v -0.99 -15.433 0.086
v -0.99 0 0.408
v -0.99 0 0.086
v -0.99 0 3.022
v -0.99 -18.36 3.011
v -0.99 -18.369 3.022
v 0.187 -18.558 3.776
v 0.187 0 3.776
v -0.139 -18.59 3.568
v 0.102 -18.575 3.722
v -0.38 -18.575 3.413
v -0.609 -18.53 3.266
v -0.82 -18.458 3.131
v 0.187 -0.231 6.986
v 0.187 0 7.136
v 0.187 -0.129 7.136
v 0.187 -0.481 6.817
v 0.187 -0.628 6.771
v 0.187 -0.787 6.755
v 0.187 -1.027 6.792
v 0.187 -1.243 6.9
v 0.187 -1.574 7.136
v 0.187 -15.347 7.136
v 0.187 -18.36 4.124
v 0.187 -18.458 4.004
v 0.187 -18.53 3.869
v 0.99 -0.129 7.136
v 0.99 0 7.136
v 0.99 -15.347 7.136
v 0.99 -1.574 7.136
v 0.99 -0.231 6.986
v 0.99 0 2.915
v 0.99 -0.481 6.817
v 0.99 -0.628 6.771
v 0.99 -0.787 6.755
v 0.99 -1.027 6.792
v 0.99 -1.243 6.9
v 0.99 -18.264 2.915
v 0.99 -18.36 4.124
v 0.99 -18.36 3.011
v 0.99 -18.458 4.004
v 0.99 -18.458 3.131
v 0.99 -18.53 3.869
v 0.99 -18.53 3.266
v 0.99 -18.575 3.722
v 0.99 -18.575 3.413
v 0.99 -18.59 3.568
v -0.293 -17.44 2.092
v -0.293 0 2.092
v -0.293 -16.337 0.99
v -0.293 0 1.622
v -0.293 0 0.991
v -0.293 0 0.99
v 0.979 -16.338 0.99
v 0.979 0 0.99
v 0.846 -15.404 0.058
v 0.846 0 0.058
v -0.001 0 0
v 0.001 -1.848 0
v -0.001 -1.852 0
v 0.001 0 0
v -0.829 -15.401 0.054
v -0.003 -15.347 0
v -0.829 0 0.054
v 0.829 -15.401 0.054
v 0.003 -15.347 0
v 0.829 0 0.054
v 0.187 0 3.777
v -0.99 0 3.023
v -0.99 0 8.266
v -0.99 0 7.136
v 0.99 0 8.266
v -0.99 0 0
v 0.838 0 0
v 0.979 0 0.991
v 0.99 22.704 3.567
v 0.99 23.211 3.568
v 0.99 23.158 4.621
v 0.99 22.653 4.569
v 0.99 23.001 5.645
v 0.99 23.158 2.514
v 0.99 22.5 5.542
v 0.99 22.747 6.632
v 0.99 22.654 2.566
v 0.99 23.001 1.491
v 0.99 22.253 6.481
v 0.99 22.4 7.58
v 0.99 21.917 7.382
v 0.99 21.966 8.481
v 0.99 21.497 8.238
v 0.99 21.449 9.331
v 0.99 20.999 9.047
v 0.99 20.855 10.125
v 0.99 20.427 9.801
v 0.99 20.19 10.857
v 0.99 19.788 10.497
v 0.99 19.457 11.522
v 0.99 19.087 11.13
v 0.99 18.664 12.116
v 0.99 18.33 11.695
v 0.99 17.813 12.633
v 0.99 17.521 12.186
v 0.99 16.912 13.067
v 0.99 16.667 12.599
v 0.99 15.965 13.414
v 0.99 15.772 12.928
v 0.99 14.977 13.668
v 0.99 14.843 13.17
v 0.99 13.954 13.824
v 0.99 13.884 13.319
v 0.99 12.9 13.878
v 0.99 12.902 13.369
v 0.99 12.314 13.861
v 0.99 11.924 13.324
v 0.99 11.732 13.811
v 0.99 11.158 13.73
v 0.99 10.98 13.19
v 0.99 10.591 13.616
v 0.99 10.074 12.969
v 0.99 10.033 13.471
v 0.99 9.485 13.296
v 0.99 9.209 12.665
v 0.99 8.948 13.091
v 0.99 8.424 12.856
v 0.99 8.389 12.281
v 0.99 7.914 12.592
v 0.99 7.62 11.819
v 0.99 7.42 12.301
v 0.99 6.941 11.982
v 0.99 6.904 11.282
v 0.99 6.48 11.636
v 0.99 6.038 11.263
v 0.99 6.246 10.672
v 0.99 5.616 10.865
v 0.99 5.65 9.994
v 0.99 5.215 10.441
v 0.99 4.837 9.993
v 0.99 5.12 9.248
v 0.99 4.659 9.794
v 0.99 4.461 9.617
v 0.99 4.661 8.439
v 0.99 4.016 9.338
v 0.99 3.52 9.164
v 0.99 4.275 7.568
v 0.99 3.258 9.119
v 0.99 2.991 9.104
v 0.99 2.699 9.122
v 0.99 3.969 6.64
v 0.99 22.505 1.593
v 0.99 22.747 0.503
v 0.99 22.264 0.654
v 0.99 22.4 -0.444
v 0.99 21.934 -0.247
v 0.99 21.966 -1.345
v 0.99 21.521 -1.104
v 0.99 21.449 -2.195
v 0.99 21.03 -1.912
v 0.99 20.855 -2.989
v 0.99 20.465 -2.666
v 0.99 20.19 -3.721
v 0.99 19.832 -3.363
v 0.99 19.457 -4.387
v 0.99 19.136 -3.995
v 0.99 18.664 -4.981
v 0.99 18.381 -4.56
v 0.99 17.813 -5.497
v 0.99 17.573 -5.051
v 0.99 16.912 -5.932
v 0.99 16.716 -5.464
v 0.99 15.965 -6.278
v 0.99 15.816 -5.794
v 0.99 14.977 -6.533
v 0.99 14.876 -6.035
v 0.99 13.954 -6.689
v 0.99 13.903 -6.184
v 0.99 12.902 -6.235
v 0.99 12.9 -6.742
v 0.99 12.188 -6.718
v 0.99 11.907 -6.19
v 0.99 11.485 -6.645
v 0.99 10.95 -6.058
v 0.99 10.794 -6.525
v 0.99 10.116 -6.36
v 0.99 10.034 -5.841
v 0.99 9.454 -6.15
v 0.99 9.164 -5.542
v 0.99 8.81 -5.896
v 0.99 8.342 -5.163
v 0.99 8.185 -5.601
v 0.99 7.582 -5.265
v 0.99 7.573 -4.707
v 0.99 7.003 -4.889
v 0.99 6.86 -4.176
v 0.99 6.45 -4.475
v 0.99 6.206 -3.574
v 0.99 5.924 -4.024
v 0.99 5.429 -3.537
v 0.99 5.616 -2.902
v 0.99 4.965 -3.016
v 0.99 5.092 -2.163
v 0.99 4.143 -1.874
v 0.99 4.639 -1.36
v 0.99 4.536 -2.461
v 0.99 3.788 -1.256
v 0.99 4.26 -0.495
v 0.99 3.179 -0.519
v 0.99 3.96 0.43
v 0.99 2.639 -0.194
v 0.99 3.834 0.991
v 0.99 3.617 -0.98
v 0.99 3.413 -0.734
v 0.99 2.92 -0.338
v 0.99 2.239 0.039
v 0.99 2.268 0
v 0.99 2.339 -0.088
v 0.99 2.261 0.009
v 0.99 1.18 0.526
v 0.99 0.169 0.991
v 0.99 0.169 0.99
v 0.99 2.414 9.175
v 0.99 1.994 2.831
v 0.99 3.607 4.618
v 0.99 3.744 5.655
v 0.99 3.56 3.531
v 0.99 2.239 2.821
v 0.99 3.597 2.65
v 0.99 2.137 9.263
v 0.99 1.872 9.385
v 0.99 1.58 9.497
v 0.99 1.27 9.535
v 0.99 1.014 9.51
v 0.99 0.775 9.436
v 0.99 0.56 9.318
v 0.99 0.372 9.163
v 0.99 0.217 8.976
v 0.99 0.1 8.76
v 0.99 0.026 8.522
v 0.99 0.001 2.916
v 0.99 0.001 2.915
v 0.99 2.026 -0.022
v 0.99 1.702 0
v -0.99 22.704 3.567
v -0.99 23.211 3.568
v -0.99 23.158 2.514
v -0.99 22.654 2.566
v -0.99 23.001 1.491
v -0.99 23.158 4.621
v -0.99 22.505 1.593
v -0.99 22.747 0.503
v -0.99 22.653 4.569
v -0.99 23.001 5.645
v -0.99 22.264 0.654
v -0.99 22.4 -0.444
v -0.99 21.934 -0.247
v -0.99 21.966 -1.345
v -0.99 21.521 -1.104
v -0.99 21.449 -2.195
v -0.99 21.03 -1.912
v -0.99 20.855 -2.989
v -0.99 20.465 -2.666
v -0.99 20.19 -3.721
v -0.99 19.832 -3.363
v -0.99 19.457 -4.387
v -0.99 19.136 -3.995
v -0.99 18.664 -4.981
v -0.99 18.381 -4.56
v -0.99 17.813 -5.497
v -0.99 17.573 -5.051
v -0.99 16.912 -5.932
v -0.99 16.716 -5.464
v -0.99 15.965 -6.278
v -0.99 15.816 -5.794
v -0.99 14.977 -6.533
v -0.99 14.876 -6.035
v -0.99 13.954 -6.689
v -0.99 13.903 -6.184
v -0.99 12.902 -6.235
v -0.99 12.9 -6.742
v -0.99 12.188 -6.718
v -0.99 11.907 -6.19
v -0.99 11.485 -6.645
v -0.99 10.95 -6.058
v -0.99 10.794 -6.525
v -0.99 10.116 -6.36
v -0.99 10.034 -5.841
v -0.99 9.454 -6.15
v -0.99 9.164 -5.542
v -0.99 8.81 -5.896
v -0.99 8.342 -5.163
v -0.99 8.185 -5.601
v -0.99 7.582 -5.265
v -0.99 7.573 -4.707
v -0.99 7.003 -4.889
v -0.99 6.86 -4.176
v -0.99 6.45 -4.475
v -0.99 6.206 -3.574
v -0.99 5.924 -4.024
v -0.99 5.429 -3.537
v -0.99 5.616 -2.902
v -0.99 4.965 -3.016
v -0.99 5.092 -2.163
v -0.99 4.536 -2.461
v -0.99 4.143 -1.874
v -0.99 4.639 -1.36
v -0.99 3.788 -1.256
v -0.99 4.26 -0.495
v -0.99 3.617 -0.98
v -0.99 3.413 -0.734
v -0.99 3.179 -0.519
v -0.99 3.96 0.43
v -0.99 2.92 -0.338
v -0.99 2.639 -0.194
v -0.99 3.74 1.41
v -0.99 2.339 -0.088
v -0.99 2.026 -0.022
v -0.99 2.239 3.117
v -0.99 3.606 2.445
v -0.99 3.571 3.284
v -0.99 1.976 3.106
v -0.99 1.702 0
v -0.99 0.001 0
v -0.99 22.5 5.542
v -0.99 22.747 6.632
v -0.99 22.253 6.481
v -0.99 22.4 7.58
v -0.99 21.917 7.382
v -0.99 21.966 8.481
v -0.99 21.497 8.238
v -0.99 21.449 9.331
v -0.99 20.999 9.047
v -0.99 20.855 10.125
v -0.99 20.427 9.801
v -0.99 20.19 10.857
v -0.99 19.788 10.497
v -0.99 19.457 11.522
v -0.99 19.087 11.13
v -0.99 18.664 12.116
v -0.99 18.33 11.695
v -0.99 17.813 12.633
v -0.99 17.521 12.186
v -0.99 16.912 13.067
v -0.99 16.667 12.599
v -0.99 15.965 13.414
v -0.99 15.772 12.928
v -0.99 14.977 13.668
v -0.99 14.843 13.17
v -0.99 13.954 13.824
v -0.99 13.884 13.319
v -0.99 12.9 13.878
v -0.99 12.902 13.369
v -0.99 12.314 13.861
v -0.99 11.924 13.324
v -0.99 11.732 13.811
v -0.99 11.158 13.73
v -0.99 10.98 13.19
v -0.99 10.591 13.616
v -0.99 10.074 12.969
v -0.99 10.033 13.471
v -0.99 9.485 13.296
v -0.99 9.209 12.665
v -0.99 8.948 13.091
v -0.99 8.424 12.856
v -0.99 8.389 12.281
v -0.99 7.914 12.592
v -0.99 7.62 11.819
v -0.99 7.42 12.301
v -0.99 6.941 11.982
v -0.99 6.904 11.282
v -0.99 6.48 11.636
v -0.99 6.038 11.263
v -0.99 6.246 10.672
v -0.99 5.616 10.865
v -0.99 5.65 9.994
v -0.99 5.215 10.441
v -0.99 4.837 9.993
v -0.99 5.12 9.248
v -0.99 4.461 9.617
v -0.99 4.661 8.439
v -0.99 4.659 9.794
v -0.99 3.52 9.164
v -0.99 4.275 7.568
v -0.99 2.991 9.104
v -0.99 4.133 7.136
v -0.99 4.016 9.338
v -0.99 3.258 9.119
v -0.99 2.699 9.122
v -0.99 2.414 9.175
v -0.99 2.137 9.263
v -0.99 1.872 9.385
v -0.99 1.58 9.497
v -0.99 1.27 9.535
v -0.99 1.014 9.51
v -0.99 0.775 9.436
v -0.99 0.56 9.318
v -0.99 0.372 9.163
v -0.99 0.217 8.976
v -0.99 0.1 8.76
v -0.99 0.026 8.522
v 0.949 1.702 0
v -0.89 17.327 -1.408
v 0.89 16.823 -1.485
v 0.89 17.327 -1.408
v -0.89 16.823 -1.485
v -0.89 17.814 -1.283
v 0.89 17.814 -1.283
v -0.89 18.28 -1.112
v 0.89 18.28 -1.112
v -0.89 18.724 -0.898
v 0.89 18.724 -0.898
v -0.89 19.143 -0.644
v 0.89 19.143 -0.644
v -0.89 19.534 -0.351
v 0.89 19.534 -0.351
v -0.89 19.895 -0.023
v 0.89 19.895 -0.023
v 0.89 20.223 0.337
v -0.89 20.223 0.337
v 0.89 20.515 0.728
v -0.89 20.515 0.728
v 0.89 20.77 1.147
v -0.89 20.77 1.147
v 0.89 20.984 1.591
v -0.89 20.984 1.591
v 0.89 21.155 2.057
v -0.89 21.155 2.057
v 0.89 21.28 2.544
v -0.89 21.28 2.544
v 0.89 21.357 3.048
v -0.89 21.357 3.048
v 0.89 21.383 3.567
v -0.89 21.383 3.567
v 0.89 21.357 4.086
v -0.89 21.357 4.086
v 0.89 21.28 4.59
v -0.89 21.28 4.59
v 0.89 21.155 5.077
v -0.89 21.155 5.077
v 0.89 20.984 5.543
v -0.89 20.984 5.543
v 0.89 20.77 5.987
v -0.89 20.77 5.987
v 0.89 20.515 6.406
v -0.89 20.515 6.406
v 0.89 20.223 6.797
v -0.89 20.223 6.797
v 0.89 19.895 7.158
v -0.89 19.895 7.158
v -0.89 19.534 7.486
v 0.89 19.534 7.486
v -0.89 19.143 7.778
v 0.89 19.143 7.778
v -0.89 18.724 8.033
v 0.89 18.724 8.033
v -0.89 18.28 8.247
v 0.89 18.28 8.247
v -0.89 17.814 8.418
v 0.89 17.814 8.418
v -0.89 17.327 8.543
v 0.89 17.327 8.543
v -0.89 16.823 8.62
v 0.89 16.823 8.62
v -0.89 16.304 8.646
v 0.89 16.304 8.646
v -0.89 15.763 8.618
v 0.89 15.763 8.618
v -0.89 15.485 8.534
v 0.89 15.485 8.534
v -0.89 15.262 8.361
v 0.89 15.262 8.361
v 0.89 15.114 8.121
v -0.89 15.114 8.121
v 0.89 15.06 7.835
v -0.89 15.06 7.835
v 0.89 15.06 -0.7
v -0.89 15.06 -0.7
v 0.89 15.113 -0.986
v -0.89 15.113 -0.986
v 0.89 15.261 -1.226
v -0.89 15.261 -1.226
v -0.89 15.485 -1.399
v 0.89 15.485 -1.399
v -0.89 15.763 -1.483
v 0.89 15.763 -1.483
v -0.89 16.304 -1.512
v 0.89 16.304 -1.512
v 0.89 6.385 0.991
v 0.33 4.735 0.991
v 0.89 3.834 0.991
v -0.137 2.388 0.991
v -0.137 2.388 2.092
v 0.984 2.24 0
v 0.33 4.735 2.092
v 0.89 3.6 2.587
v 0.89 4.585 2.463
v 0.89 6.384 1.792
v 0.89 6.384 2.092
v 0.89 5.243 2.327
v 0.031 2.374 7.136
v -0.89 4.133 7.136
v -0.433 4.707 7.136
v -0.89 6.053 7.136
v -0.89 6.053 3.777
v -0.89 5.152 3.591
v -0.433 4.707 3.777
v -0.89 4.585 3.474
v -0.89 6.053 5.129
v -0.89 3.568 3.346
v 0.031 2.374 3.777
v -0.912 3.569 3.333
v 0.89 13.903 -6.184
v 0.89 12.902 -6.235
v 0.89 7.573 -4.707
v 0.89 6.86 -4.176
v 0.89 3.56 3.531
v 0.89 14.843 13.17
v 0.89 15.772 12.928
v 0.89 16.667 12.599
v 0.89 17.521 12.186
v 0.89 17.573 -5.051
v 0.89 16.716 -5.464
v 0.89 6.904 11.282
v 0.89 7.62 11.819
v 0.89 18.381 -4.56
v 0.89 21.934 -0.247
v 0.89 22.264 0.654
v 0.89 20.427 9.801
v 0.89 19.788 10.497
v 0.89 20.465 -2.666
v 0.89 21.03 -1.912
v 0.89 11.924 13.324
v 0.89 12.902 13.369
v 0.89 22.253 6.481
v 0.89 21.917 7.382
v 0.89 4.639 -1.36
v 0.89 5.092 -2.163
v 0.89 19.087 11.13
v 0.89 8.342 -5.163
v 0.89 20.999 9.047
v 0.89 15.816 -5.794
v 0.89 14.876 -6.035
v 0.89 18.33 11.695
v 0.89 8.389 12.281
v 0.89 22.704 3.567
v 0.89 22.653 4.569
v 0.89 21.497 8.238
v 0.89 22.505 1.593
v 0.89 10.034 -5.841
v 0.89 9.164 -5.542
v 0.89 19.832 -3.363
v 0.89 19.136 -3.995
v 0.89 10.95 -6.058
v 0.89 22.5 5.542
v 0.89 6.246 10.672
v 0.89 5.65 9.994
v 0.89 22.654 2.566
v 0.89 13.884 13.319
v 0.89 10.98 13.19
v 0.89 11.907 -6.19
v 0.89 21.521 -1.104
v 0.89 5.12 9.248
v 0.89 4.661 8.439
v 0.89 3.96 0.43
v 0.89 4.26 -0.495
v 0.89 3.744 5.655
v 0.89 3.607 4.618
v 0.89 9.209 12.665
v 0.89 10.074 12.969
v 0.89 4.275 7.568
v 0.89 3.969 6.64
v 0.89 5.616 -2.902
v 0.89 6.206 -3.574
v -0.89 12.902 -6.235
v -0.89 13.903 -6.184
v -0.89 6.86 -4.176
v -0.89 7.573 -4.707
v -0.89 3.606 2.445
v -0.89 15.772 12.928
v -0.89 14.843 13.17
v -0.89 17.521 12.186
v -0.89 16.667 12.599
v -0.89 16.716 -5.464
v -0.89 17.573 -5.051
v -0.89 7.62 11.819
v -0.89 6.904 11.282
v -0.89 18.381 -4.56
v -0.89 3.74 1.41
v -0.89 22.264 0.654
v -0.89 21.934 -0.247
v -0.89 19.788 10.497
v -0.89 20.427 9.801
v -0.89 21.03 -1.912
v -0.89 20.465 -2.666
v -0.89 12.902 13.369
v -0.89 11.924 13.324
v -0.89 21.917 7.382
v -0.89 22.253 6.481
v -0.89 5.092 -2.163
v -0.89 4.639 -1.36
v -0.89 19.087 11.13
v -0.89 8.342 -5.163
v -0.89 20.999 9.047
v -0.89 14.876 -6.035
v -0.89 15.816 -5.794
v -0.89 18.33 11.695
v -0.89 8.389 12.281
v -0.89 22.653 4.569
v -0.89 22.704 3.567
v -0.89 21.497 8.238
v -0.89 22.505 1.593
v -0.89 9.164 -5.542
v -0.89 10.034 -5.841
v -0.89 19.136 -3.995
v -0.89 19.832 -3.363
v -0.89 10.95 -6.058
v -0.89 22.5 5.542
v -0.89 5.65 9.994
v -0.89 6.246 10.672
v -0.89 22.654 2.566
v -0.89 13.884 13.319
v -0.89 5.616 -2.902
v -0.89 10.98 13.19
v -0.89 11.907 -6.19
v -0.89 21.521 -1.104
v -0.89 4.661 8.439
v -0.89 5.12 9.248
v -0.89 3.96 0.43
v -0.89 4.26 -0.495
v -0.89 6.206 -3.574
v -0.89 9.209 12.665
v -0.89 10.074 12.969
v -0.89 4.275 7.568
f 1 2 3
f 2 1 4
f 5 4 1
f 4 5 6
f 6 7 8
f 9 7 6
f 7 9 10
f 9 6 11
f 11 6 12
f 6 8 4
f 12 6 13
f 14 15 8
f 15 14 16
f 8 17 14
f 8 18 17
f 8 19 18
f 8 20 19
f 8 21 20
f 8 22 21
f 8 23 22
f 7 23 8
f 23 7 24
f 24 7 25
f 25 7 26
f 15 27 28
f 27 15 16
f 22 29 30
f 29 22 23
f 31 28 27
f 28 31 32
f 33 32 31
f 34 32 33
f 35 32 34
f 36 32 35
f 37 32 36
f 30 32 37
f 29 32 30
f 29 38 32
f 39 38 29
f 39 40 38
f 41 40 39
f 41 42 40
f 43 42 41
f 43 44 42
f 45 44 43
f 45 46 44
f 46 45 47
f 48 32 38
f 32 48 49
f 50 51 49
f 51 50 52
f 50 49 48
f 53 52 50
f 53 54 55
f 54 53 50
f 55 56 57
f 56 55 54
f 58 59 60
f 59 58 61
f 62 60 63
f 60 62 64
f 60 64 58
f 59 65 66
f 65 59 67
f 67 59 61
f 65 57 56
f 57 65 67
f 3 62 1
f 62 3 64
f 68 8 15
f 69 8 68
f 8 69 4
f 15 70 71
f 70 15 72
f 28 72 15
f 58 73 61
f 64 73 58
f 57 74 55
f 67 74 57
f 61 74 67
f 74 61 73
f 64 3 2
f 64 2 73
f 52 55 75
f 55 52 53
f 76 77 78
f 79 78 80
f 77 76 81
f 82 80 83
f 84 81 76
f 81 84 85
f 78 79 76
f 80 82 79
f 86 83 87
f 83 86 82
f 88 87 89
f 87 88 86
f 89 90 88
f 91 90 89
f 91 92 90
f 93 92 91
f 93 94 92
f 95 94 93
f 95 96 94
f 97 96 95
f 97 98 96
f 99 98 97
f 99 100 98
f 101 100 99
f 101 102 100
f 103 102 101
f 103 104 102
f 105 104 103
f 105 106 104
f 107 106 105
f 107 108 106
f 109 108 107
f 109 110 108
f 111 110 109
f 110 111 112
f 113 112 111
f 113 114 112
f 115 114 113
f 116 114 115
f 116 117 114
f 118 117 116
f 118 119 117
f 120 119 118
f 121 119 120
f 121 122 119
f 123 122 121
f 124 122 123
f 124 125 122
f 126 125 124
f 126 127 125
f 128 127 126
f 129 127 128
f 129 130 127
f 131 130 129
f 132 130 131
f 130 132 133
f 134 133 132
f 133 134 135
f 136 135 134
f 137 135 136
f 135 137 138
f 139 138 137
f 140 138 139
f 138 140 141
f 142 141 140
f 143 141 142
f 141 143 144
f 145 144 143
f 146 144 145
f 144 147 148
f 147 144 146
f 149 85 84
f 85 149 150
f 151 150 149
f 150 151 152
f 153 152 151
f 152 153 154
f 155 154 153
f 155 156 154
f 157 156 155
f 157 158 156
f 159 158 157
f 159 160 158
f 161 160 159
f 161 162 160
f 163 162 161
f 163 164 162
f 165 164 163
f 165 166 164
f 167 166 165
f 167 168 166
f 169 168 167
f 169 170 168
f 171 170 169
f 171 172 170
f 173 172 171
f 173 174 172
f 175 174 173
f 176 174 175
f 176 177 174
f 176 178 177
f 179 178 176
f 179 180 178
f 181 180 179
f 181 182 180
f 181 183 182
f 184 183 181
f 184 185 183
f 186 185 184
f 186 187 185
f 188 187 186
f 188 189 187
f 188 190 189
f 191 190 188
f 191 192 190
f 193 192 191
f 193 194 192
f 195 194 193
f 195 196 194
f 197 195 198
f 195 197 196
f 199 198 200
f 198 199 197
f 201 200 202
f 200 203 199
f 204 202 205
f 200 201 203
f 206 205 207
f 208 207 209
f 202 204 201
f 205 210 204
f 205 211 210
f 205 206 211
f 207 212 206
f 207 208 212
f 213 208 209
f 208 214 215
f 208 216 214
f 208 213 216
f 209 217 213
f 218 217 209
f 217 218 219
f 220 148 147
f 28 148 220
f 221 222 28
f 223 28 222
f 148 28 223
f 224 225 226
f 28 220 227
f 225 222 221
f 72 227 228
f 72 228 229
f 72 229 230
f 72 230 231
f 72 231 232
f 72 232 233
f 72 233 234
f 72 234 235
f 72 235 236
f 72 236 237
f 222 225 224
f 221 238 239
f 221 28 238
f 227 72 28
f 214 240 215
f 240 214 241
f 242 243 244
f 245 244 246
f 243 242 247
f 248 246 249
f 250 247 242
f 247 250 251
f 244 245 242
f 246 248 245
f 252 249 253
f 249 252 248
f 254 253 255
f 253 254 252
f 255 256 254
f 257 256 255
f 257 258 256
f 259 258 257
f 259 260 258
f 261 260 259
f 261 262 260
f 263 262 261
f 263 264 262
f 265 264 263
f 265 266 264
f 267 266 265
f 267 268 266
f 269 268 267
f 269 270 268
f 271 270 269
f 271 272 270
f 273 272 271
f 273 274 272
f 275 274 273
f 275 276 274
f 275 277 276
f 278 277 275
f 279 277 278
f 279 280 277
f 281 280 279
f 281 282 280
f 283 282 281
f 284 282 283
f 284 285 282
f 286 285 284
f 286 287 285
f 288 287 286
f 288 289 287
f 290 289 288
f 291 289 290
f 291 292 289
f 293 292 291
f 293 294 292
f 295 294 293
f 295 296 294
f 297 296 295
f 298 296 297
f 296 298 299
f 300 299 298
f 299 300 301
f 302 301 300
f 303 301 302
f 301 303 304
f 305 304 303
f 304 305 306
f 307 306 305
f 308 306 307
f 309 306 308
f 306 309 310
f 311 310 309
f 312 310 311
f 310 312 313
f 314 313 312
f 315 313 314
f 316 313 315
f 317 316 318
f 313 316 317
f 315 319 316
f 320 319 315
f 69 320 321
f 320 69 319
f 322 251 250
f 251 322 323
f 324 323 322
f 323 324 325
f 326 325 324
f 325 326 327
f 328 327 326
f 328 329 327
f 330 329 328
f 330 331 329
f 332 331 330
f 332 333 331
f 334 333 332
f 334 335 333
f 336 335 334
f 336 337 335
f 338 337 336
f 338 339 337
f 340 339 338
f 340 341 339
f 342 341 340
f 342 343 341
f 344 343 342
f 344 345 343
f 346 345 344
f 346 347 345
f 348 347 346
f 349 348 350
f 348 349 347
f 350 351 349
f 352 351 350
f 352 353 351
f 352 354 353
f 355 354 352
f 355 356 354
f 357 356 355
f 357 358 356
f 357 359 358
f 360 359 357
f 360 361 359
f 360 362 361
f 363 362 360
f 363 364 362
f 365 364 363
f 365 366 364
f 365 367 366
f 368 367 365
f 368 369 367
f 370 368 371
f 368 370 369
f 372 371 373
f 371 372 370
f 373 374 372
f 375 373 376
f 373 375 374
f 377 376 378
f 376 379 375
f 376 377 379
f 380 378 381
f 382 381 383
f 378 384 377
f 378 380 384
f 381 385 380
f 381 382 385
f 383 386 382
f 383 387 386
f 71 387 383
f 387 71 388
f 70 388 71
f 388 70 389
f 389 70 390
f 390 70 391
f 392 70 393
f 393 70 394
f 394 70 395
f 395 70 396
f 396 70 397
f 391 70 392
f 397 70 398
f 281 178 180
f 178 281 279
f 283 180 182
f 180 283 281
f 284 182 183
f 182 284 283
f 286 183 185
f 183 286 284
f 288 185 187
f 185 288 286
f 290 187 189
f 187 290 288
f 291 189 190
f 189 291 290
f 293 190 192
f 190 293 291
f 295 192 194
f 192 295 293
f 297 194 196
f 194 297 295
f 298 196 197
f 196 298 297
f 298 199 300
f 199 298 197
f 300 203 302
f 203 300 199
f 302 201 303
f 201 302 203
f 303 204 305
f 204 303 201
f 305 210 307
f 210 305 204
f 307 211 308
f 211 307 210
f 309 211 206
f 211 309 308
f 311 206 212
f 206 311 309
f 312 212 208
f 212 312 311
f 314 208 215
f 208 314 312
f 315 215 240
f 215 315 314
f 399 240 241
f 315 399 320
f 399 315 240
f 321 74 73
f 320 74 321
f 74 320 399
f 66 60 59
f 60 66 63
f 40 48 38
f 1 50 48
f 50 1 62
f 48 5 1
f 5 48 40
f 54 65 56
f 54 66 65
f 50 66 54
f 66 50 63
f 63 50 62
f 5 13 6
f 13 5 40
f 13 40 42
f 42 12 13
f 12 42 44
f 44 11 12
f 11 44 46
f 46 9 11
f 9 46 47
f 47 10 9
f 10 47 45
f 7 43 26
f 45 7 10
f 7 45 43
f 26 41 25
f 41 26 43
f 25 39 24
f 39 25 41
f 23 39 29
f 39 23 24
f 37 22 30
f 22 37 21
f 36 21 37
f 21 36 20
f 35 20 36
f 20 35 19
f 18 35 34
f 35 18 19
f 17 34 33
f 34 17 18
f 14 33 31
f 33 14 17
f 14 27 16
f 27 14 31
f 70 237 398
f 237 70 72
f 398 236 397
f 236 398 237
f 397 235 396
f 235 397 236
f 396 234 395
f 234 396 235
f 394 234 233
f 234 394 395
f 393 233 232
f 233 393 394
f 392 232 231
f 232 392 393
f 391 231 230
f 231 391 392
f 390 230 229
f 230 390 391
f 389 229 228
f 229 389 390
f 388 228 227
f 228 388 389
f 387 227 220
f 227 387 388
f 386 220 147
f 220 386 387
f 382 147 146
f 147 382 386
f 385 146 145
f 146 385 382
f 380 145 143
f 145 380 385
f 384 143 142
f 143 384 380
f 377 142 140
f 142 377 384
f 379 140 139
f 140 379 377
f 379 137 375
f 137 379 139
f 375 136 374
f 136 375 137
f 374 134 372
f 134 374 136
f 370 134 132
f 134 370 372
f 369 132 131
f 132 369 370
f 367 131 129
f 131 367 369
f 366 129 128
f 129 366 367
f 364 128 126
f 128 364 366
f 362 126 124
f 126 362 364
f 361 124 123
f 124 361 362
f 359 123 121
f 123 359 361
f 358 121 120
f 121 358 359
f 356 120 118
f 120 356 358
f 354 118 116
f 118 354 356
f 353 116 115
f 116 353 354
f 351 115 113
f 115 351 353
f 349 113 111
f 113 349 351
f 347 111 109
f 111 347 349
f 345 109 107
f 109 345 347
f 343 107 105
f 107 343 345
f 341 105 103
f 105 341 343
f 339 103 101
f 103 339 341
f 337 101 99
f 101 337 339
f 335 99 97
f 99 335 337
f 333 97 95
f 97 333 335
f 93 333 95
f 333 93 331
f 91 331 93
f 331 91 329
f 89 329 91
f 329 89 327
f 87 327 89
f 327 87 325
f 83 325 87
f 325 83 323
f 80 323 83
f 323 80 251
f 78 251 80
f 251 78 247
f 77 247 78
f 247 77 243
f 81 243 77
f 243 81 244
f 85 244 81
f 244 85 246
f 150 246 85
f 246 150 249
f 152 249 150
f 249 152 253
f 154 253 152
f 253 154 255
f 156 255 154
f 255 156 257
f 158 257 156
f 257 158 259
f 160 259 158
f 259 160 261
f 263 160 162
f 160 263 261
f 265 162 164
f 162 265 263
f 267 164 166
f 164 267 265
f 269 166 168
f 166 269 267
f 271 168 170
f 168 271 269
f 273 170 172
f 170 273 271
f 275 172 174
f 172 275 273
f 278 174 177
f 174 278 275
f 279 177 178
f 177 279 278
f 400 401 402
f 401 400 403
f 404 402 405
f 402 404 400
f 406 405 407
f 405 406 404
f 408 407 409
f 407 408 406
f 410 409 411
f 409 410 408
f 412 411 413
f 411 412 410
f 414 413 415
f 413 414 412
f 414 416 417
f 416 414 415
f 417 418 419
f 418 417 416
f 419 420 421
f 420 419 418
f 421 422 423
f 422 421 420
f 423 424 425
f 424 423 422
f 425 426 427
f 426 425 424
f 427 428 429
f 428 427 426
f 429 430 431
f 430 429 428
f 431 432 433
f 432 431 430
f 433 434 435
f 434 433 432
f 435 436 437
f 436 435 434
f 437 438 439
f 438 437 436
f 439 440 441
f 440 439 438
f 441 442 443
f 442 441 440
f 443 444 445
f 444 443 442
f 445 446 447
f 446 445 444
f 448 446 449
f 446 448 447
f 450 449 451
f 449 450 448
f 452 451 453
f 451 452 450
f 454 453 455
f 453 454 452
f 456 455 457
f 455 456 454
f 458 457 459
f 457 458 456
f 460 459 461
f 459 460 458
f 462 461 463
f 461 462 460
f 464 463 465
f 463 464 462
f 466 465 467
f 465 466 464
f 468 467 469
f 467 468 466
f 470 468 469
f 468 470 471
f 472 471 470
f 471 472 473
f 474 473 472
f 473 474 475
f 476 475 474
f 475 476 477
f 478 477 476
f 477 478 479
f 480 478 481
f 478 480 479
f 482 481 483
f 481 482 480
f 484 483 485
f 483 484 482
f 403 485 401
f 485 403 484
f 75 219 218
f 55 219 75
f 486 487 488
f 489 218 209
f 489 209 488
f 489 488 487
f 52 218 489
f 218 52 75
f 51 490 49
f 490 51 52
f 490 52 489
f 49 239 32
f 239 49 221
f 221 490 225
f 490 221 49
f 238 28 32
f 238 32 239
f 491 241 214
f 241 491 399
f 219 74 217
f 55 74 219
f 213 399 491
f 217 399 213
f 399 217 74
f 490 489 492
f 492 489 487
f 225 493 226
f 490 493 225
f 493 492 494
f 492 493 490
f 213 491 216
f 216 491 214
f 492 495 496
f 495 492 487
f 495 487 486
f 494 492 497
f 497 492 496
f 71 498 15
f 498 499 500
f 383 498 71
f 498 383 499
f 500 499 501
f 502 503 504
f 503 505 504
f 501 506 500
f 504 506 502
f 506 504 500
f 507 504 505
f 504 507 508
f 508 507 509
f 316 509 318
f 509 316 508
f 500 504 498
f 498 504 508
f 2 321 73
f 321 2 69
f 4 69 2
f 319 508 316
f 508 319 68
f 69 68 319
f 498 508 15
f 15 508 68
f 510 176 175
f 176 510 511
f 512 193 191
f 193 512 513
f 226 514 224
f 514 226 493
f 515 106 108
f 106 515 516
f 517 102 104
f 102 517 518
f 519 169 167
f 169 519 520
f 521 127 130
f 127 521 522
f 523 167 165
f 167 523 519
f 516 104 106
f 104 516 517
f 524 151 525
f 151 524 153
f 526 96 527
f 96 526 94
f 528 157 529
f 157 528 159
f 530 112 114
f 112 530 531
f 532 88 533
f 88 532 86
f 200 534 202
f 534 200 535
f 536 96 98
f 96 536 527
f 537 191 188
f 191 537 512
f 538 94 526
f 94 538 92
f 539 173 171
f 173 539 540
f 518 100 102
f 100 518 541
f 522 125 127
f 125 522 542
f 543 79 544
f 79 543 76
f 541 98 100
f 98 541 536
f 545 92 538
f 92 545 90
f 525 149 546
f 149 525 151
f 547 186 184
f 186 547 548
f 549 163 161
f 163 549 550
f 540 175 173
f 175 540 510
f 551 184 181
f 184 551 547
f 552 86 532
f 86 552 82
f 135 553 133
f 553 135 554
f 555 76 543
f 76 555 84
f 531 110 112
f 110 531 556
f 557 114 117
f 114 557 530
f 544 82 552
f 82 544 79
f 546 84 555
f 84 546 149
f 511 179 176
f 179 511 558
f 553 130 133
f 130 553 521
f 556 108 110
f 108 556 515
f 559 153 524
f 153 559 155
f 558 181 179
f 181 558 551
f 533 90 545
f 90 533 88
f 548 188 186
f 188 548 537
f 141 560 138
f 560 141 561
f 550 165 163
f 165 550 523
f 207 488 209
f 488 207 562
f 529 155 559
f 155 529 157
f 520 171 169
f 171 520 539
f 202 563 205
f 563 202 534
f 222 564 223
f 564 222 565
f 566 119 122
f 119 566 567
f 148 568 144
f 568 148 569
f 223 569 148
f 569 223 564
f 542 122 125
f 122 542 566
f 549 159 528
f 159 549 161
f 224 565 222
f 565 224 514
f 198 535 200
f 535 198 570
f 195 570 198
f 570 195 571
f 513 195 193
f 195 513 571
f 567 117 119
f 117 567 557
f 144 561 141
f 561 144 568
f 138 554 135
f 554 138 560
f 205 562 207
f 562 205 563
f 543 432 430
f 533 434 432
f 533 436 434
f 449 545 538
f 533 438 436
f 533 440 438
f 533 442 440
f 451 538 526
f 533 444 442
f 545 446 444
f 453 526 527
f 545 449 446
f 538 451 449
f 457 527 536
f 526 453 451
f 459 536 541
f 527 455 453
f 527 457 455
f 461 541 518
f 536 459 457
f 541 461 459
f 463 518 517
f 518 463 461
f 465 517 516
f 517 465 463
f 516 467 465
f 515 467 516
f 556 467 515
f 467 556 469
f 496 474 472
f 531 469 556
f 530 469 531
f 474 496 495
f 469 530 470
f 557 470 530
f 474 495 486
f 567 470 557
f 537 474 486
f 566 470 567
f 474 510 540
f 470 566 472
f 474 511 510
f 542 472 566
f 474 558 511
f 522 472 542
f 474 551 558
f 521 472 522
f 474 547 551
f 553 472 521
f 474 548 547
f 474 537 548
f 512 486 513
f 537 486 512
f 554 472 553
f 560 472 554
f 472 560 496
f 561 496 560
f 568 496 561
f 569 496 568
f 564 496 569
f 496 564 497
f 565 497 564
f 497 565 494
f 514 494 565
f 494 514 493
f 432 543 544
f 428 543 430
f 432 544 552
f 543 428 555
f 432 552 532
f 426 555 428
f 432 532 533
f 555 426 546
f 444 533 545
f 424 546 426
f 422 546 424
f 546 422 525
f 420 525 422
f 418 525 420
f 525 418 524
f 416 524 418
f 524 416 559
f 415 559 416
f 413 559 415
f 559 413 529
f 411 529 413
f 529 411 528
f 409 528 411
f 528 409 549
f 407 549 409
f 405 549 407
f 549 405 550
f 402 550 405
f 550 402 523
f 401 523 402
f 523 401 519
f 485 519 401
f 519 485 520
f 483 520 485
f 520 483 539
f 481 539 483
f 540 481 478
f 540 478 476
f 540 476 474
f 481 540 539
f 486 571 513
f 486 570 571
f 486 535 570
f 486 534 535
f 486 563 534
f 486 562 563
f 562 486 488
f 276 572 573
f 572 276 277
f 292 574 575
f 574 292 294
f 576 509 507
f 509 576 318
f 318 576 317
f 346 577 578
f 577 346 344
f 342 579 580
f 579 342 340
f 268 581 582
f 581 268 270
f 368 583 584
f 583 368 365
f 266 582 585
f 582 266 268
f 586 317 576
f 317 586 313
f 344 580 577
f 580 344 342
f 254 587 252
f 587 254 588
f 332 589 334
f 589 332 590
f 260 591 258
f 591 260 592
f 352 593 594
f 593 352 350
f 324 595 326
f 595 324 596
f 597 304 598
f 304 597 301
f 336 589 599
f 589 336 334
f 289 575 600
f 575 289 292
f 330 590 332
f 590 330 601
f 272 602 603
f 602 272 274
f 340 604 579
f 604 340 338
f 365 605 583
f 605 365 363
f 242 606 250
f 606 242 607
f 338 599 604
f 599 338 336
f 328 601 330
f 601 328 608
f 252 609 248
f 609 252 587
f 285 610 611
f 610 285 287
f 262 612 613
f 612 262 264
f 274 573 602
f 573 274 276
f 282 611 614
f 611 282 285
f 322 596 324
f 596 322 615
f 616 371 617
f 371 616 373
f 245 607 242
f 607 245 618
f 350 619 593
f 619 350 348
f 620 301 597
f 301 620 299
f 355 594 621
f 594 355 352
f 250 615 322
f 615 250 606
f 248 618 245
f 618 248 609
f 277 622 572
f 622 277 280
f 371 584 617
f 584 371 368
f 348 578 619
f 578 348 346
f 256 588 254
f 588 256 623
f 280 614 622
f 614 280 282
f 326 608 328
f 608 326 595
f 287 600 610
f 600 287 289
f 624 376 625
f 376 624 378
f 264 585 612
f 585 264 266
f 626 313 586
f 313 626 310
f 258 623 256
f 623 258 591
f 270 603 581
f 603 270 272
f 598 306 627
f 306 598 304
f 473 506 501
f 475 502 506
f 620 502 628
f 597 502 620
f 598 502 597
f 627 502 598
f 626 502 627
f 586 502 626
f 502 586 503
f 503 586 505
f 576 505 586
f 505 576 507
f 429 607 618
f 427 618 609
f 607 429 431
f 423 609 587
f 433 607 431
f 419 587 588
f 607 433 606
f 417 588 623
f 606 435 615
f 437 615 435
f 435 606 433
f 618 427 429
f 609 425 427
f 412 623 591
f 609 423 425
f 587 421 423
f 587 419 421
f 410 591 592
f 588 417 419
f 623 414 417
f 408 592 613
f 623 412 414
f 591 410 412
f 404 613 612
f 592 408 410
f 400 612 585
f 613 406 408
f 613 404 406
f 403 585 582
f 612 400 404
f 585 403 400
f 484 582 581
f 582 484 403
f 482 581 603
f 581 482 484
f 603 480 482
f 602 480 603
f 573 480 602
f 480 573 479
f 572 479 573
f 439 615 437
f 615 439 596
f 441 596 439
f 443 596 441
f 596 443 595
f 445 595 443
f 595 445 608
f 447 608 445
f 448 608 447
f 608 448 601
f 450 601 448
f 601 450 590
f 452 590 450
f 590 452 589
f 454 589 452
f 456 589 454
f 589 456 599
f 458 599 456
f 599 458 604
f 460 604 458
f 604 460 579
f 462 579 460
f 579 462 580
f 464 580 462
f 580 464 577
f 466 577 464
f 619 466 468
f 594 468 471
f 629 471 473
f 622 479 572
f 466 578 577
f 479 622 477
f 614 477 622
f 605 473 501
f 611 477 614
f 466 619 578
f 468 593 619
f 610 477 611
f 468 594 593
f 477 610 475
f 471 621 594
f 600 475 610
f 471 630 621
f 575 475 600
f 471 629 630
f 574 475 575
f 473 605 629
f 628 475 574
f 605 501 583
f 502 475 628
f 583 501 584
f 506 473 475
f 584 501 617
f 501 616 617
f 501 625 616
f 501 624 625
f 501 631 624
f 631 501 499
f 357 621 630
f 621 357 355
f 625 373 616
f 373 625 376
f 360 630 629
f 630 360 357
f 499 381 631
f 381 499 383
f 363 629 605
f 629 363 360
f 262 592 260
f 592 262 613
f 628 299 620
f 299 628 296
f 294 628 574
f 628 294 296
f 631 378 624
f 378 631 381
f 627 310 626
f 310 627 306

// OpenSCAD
// file: master.gen.scad
// Automatically generated using the Inkscape to OpenSCAD Converter
// Variable names are of the form <inkscape-path-id>_points and
// <inkscape-path-id>_paths.  As a result, you can associate a polygon in this
// OpenSCAD program with the corresponding SVG element in the Inkscape document
// by looking for the XML element with the attribute id="inkscape-path-id".

engrave_k1_points = [[-28.962097, 9.801675], [-29.944589, 9.751037], [-30.903229, 9.602418], [-31.832563, 9.360756], [-32.727135, 9.030990], [-33.581489, 8.618061], [-34.390172, 8.126906], [-35.147727, 7.562467], [-35.848701, 6.929681], [-36.487636, 6.233487], [-37.059079, 5.478827], [-37.557575, 4.670637], [-37.977667, 3.813859], [-38.313902, 2.913431], [-38.560824, 1.974292], [-38.712977, 1.001382], [-38.764907, -0.000359], [-38.714266, -1.002096], [-38.565636, -1.975001], [-38.323956, -2.914137], [-37.994166, -3.814563], [-37.581206, -4.671341], [-37.090014, -5.479530], [-36.525531, -6.234191], [-35.892697, -6.930386], [-35.196450, -7.563174], [-34.441730, -8.127616], [-33.633477, -8.618773], [-32.776630, -9.031704], [-31.876129, -9.361472], [-30.936914, -9.603135], [-29.963923, -9.751756], [-28.962097, -9.802393], [-27.967318, -9.757819], [-27.010356, -9.625809], [-26.094847, -9.408934], [-25.224430, -9.109765], [-24.402741, -8.730873], [-23.633420, -8.274827], [-22.920103, -7.744200], [-22.266428, -7.141561], [-21.676032, -6.469482], [-21.152554, -5.730532], [-20.699631, -4.927283], [-20.320900, -4.062305], [-20.020000, -3.138169], [-19.800567, -2.157446], [-19.666240, -1.122706], [-19.620656, -0.036519], [-19.667405, 1.050479], [-19.804915, 2.087515], [-20.029083, 3.071805], [-20.335807, 4.000567], [-20.720981, 4.871018], [-21.180504, 5.680376], [-21.710270, 6.425859], [-22.306178, 7.104683], [-22.964123, 7.714066], [-23.680002, 8.251226], [-24.449712, 8.713380], [-25.269148, 9.097746], [-26.134209, 9.401541], [-27.040789, 9.621982], [-27.984786, 9.756288], [-28.962097, 9.801675]];
engrave_k1_paths = [[0, 1, 2, 3, 4, 5, 6, 7, 8, 9, 10, 11, 12, 13, 14, 15, 16, 17, 18, 19, 20, 21, 22, 23, 24, 25, 26, 27, 28, 29, 30, 31, 32, 33, 34, 35, 36, 37, 38, 39, 40, 41, 42, 43, 44, 45, 46, 47, 48, 49, 50, 51, 52, 53, 54, 55, 56, 57, 58, 59, 60, 61, 62, 63, 64]];

warding_k1_points = [[13.950705, 3.568361], [14.754165, 3.568165], [14.754175, 0.208911], [15.930705, -0.545276], [15.930675, -3.567469], [14.103105, -3.567559], [13.961765, -2.577205], [15.234191, -2.577382], [15.233961, -1.475532], [13.950735, -0.652344]];
warding_k1_paths = [[0, 1, 2, 3, 4, 5, 6, 7, 8, 9]];

outline_k1_points = [[-39.271415, -0.000000], [-39.218146, -1.053647], [-39.061805, -2.076969], [-38.807587, -3.064771], [-38.460689, -4.011856], [-38.026308, -4.913032], [-37.509640, -5.763100], [-36.915881, -6.556867], [-36.250229, -7.289138], [-35.517880, -7.954715], [-34.724030, -8.548406], [-33.873875, -9.065013], [-32.972613, -9.499341], [-32.025439, -9.846196], [-31.037551, -10.100382], [-30.014145, -10.256704], [-28.960417, -10.309966], [-28.248366, -10.285433], [-27.545711, -10.212663], [-26.854512, -10.092897], [-26.176829, -9.927375], [-25.514723, -9.717340], [-24.870253, -9.464031], [-24.245480, -9.168691], [-23.642464, -8.832561], [-23.063266, -8.456881], [-22.509945, -8.042892], [-21.984563, -7.591837], [-21.489178, -7.104956], [-21.025853, -6.583490], [-20.596646, -6.028680], [-20.203618, -5.441768], [-19.848829, -4.823994], [-19.677667, -4.548047], [-19.473327, -4.301548], [-19.239587, -4.086761], [-18.980226, -3.905950], [-18.699021, -3.761379], [-18.399752, -3.655310], [-18.086197, -3.590010], [-17.762134, -3.567740], [-0.713562, -3.567558], [2.299175, -0.556553], [2.397591, -0.436786], [2.469883, -0.301310], [2.514440, -0.154317], [2.529651, -0.000000], [2.514440, 0.154240], [2.469881, 0.301105], [2.397589, 0.436557], [2.299175, 0.556556], [-0.713562, 3.568442], [-14.486365, 3.568258], [-14.817094, 3.332613], [-15.033908, 3.224503], [-15.273397, 3.187404], [-15.431988, 3.203398], [-15.579712, 3.249269], [-15.829883, 3.417963], [-15.998569, 3.668136], [-16.044436, 3.815854], [-16.060429, 3.974435], [-16.060429, 4.697904], [-16.086224, 4.953787], [-16.160205, 5.192119], [-16.277267, 5.407794], [-16.432305, 5.595706], [-16.620214, 5.750748], [-16.835890, 5.867814], [-17.074227, 5.941798], [-17.330120, 5.967594], [-17.640342, 5.929440], [-17.932150, 5.817216], [-18.197320, 5.695536], [-18.474270, 5.607541], [-18.759858, 5.554103], [-19.050943, 5.536096], [-19.318402, 5.551272], [-19.579935, 5.596067], [-20.076127, 5.770131], [-20.521328, 6.049515], [-20.719120, 6.225962], [-20.897343, 6.425448], [-21.275628, 6.873563], [-21.676421, 7.297072], [-22.098489, 7.695381], [-22.540600, 8.067897], [-23.001519, 8.414026], [-23.480015, 8.733173], [-23.974854, 9.024744], [-24.484804, 9.288145], [-25.008631, 9.522783], [-25.545102, 9.728063], [-26.092985, 9.903392], [-26.651046, 10.048174], [-27.218053, 10.161817], [-27.792772, 10.243726], [-28.373971, 10.293307], [-28.960417, 10.309965], [-30.014145, 10.256703], [-31.037551, 10.100381], [-32.025439, 9.846193], [-32.972613, 9.499337], [-33.873875, 9.065006], [-34.724030, 8.548396], [-35.517880, 7.954704], [-36.250229, 7.289124], [-36.915881, 6.556853], [-37.509640, 5.763085], [-38.026308, 4.913016], [-38.460689, 4.011841], [-38.807587, 3.064757], [-39.061805, 2.076958], [-39.218146, 1.053641], [-39.271415, -0.000000], [-37.443620, -0.000529], [-37.417380, 0.518508], [-37.340367, 1.022606], [-37.215140, 1.509206], [-37.044258, 1.975748], [-36.830282, 2.419674], [-36.575771, 2.838423], [-36.283285, 3.229438], [-35.955383, 3.590158], [-35.594624, 3.918025], [-35.203569, 4.210479], [-34.784776, 4.464962], [-34.340806, 4.678914], [-33.874218, 4.849776], [-33.387572, 4.974988], [-32.883427, 5.051993], [-32.364343, 5.078229], [-31.823807, 5.049810], [-31.545150, 4.966254], [-31.322137, 4.793588], [-31.174130, 4.553438], [-31.120491, 4.267429], [-31.119962, -4.267450], [-31.173647, -4.553470], [-31.321813, -4.793654], [-31.545012, -4.966461], [-31.823793, -5.050349], [-32.364329, -5.079290], [-32.883413, -5.053052], [-33.387558, -4.976047], [-33.874205, -4.850833], [-34.340793, -4.679969], [-34.784763, -4.466015], [-35.203555, -4.211530], [-35.594611, -3.919074], [-35.955369, -3.591205], [-36.283272, -3.230483], [-36.575758, -2.839468], [-36.830269, -2.420718], [-37.044245, -1.976793], [-37.215127, -1.510253], [-37.340354, -1.023656], [-37.417367, -0.519562], [-37.443607, -0.000531]];
outline_k1_paths = [[0, 1, 2, 3, 4, 5, 6, 7, 8, 9, 10, 11, 12, 13, 14, 15, 16, 17, 18, 19, 20, 21, 22, 23, 24, 25, 26, 27, 28, 29, 30, 31, 32, 33, 34, 35, 36, 37, 38, 39, 40, 41, 42, 43, 44, 45, 46, 47, 48, 49, 50, 51, 52, 53, 54, 55, 56, 57, 58, 59, 60, 61, 62, 63, 64, 65, 66, 67, 68, 69, 70, 71, 72, 73, 74, 75, 76, 77, 78, 79, 80, 81, 82, 83, 84, 85, 86, 87, 88, 89, 90, 91, 92, 93, 94, 95, 96, 97, 98, 99, 100, 101, 102, 103, 104, 105, 106, 107, 108, 109, 110, 111, 112, 113, 114], [158, 157, 156, 155, 154, 153, 152, 151, 150, 149, 148, 147, 146, 145, 144, 143, 142, 141, 140, 139, 138, 137, 136, 135, 134, 133, 132, 131, 130, 129, 128, 127, 126, 125, 124, 123, 122, 121, 120, 119, 118, 117, 116, 115]];

warding_k2_points = [[39.271415, 3.568360], [38.467955, 3.568164], [38.467945, 0.208911], [37.291405, -0.545275], [37.291435, -3.567470], [39.119015, -3.567560], [39.260355, -2.577206], [37.987915, -2.577382], [37.988145, -1.475532], [39.271385, -0.652346]];
warding_k2_paths = [[0, 1, 2, 3, 4, 5, 6, 7, 8, 9]];

//polygon(points=engrave_k1_points, paths=engrave_k1_paths);
//polygon(points=warding_k1_points, paths=warding_k1_paths);
//polygon(points=outline_k1_points, paths=outline_k1_paths);
//polygon(points=warding_k2_points, paths=warding_k2_paths);
// file: keygen.scad
$inf=1000;
$eps=.001;

function key_move(points, offset) = [
    for(p=points) [p[0] + offset[0],
                   p[1] + offset[1]]
];

module key_outline(outline_points, thickness, outline_paths=undef) {
    rotate(-90, [0, 1, 0]) rotate(-90, [0, 0, 1]) // Rotate into the correct plane
        linear_extrude(height=thickness, center=true) // Extrude the key outline
            polygon(points=outline_points, paths=outline_paths); // Draw the outline
}

module key_blade(warding, plug_diameter=0) {
    // Draw the blade to infinity in Y
    // optionally intersected with the plug cylinder
    // to round the bottom
    intersection() {
        rotate(180, [0, 0, 1]) rotate(90, [1, 0, 0])
            linear_extrude(height=2*$inf, center=true)
                polygon(warding);

        // Draw the plug, if a plug diameter is specified
        if(plug_diameter > 0) {
            // Draw infinite cylinder in -Y
            translate([0, 0, 0.5*plug_diameter]) rotate(90, [1, 0, 0])
                cylinder(r=0.5*plug_diameter, h=$inf, center=true, $fn=$fn ? 4*$fn : 48);
        }
    }
}

module key_x_line(length) {
    // Hack to draw something close to a line in X
    // since OpenSCAD does not support line primitives
    square([length, $eps], center=true);
}

module key_warding_cutter(warding, blade_height, cutter_radius, left) {
    neg = left ? -1 : 1;
    translate([neg * cutter_radius, 0, 0])
        rotate_extrude($fn=$fn ? 4*$fn : 48)
            translate([neg * cutter_radius, 0])
                difference() {
                    translate([0, 0.5*blade_height])
                        square([2 * cutter_radius, blade_height], center=true);
                    minkowski() {
                        translate([neg * 1.5 * cutter_radius, 0])
                            key_x_line(3 * cutter_radius);
                        polygon(warding);
                    }
                    polygon(warding);
                }
}

module key_engrave(engrave_points, engrave_depth, left, thickness, engrave_paths=undef) {
    translate([(left ? -1 : 1) * 0.5*thickness, 0, 0]) rotate(-90, [0, 1, 0]) rotate(-90, [0, 0, 1]) // Translate and rotate into the correct soot
        linear_extrude(height=2*engrave_depth, center=true) // Extrude the key outline
            polygon(points=engrave_points, paths=engrave_paths); // Draw the outline
}

module key_blank(outline_points,
                warding,
                outline_paths=undef,
                engrave_right_points=[],
                engrave_right_paths=undef,
                engrave_left_points=[],
                engrave_left_paths=undef,
                bow_thickness=0,
                engrave_depth=.1,
                plug_diameter=0,
                offset=[0, 0],
                cutter_radius=18,
                milling_offset=0) {

    // Find the bounding box of the warding
    warding_min = [min([for(e=warding) e[0]]), min([for(e=warding) e[1]])];
    warding_max = [max([for(e=warding) e[0]]), max([for(e=warding) e[1]])];

    // Apply the given offset to the outline,
    // holes, and engrave
    outline_adj = key_move(outline_points, offset);
    engrave_left_adj = key_move(engrave_left_points, offset);
    engrave_right_adj = key_move(engrave_right_points, offset);

    // Move the warding profile
    // so that it is centered in X
    // and non-negative in Y
    warding_offset = [-0.5 * (warding_min[0] + warding_max[0]),
                      -warding_min[1]];
    warding_adj = key_move(warding, warding_offset);

    // Infer various key properties
    thickness = (bow_thickness == 0) ? abs(warding_max[0] - warding_min[0]) : bow_thickness;
    blade_height = abs(warding_max[1] - warding_min[1]);

    // Cut out the warding milling artifacts
    // from the bow
    difference() {
        // Create the bulk of the keyblank
        // by intersecting the outline
        // with the warding profile
        // and the plug
        intersection() {
            // Draw the key outline and holes
            key_outline(outline_adj, thickness, outline_paths);
            
            // Draw the blade, and a giant box where the bow is
            // so that we don't wipe out the bow
            // when the intersection happens
            union() {
                // Fill +Y half-space
                translate([0, $inf/2+milling_offset, 0])
                    cube([$inf, $inf, $inf], center=true);

                key_blade(warding_adj, plug_diameter);
            }
        }
        // Draw the milling wheels that cut the warding
        if(cutter_radius != 0) {
            translate([0, milling_offset, 0])
                union() {
                    key_warding_cutter(warding_adj, blade_height, cutter_radius, false);
                    key_warding_cutter(warding_adj, blade_height, cutter_radius, true);
                }
        }

        // Draw the engraveing
        key_engrave(engrave_right_adj, engrave_depth, false, thickness, engrave_right_paths);
        key_engrave(engrave_left_adj, engrave_depth, true, thickness, engrave_left_paths);
    }
}

function key_code_to_heights(code, depth_table) = [for(i=key_enum(code)) depth_table[search(code[i], "0123456789")[0]]];

module key_bitting_cutter(flat, angle, tool_height) {
    polygon([[-0.5 * flat, 0],
            [0.5 * flat, 0],
            [0.5 * flat + tan(0.5 * angle) * tool_height, tool_height],
            [-0.5 * flat - tan(0.5 * angle) * tool_height, tool_height]]);
}

module key_bitting(heights,
                   locations,
                   flat,
                   angle=100,
                   cutter_width=5,
                   cutter_height=5,
                   angles=[]) {
    // Rotate the cutting tool to the proper orientation
    rotate(-90, [0, 0, 1]) rotate(90, [1, 0, 0])
        // Union together a handful of trapezoids
        // that comprise the cuts
        union() {
            for(i=key_enum(heights)) {
                // Move to the proper location and height, and maybe rotate
                translate([locations[i], heights[i]]) rotate(i >= len(angles) ? 0 : angles[i], [0, 1, 0])
                    linear_extrude(height=cutter_width, center=true)
                        key_bitting_cutter(flat, angle, cutter_height);
            }
        }
}

function key_lkup(ks, vs, k) = vs[search([k], [for(ki=ks) [ki]])[0]];
    
function key_enum(l) = len(l) > 0 ? [for(i=[0:len(l)-1]) i] : [];

function _strcat(v, i, car, s) = (i==s ? v[i] : str(_strcat(v, i-1, car, s), str(car,v[i]) )); // from https://www.thingiverse.com/thing:202724

function _strslice(l, start, stop) =
        stop > start
        ? _strcat([for(i=[start:stop]) l[i]], stop-start, "", 0)
        : "";

function key_split_on_dash(s) = [
    for(i=[0:len(search("-", s, 0)[0])])
        _strslice(s, search("-", str("-", s), 0)[0][i], search("-", str(s, "-"), 0)[0][i]-1)
];
// main file
use <keygen.scad>
include <master.gen.scad>

module kwikset(bitting="",
               outline_name="K1",
               warding_name="K1") {

    name = "Master";

    /*
        Bitting is specified from bow to tip, 0-7, with 0 being the shallowest cut and 7 being the deepest.
        Example: 5437
    */

    outlines_k = ["K1"];
    outlines_v = [[outline_k1_points, outline_k1_paths,
                   [-outline_k1_points[61][0], -outline_k1_points[40][1]],
                   engrave_k1_points,
                   engrave_k1_paths]];
    wardings_k = ["K1",
                  "K2"];
    wardings_v = [warding_k1_points,
                  warding_k2_points];

    outline_param = key_lkup(outlines_k, outlines_v, outline_name);
    outline_points = outline_param[0];
    outline_paths = outline_param[1];
    offset = outline_param[2];
    engrave_points = outline_param[3];
    engrave_paths = outline_param[4];

    warding_points = key_lkup(wardings_k, wardings_v, warding_name);
    
    cut_locations = [for(i=[.187:.125:.563]) i*25.4];
    depth_table = [for(i=[0.2720, 0.2565, 0.2410, 0.2255, 0.2100, 0.1945, 0.1790, 0.1635]) i*25.4];

    heights = key_code_to_heights(bitting, depth_table);

    difference() {
        if($children == 0) {
            key_blank(outline_points,
                      warding_points,
                      outline_paths=outline_paths,
                      engrave_right_points=engrave_points,
                      engrave_right_paths=engrave_paths,
                      engrave_left_points=engrave_points,
                      engrave_left_paths=engrave_paths,
                      offset=offset,
                      plug_diameter=12.7);
        } else {
            children(0);
        }
        key_bitting(heights, cut_locations, 1.27, cutter_height=3);
    }
}

// Defaults
bitting="";
outline="K1";
warding="K1";
kwikset(bitting, outline, warding);
